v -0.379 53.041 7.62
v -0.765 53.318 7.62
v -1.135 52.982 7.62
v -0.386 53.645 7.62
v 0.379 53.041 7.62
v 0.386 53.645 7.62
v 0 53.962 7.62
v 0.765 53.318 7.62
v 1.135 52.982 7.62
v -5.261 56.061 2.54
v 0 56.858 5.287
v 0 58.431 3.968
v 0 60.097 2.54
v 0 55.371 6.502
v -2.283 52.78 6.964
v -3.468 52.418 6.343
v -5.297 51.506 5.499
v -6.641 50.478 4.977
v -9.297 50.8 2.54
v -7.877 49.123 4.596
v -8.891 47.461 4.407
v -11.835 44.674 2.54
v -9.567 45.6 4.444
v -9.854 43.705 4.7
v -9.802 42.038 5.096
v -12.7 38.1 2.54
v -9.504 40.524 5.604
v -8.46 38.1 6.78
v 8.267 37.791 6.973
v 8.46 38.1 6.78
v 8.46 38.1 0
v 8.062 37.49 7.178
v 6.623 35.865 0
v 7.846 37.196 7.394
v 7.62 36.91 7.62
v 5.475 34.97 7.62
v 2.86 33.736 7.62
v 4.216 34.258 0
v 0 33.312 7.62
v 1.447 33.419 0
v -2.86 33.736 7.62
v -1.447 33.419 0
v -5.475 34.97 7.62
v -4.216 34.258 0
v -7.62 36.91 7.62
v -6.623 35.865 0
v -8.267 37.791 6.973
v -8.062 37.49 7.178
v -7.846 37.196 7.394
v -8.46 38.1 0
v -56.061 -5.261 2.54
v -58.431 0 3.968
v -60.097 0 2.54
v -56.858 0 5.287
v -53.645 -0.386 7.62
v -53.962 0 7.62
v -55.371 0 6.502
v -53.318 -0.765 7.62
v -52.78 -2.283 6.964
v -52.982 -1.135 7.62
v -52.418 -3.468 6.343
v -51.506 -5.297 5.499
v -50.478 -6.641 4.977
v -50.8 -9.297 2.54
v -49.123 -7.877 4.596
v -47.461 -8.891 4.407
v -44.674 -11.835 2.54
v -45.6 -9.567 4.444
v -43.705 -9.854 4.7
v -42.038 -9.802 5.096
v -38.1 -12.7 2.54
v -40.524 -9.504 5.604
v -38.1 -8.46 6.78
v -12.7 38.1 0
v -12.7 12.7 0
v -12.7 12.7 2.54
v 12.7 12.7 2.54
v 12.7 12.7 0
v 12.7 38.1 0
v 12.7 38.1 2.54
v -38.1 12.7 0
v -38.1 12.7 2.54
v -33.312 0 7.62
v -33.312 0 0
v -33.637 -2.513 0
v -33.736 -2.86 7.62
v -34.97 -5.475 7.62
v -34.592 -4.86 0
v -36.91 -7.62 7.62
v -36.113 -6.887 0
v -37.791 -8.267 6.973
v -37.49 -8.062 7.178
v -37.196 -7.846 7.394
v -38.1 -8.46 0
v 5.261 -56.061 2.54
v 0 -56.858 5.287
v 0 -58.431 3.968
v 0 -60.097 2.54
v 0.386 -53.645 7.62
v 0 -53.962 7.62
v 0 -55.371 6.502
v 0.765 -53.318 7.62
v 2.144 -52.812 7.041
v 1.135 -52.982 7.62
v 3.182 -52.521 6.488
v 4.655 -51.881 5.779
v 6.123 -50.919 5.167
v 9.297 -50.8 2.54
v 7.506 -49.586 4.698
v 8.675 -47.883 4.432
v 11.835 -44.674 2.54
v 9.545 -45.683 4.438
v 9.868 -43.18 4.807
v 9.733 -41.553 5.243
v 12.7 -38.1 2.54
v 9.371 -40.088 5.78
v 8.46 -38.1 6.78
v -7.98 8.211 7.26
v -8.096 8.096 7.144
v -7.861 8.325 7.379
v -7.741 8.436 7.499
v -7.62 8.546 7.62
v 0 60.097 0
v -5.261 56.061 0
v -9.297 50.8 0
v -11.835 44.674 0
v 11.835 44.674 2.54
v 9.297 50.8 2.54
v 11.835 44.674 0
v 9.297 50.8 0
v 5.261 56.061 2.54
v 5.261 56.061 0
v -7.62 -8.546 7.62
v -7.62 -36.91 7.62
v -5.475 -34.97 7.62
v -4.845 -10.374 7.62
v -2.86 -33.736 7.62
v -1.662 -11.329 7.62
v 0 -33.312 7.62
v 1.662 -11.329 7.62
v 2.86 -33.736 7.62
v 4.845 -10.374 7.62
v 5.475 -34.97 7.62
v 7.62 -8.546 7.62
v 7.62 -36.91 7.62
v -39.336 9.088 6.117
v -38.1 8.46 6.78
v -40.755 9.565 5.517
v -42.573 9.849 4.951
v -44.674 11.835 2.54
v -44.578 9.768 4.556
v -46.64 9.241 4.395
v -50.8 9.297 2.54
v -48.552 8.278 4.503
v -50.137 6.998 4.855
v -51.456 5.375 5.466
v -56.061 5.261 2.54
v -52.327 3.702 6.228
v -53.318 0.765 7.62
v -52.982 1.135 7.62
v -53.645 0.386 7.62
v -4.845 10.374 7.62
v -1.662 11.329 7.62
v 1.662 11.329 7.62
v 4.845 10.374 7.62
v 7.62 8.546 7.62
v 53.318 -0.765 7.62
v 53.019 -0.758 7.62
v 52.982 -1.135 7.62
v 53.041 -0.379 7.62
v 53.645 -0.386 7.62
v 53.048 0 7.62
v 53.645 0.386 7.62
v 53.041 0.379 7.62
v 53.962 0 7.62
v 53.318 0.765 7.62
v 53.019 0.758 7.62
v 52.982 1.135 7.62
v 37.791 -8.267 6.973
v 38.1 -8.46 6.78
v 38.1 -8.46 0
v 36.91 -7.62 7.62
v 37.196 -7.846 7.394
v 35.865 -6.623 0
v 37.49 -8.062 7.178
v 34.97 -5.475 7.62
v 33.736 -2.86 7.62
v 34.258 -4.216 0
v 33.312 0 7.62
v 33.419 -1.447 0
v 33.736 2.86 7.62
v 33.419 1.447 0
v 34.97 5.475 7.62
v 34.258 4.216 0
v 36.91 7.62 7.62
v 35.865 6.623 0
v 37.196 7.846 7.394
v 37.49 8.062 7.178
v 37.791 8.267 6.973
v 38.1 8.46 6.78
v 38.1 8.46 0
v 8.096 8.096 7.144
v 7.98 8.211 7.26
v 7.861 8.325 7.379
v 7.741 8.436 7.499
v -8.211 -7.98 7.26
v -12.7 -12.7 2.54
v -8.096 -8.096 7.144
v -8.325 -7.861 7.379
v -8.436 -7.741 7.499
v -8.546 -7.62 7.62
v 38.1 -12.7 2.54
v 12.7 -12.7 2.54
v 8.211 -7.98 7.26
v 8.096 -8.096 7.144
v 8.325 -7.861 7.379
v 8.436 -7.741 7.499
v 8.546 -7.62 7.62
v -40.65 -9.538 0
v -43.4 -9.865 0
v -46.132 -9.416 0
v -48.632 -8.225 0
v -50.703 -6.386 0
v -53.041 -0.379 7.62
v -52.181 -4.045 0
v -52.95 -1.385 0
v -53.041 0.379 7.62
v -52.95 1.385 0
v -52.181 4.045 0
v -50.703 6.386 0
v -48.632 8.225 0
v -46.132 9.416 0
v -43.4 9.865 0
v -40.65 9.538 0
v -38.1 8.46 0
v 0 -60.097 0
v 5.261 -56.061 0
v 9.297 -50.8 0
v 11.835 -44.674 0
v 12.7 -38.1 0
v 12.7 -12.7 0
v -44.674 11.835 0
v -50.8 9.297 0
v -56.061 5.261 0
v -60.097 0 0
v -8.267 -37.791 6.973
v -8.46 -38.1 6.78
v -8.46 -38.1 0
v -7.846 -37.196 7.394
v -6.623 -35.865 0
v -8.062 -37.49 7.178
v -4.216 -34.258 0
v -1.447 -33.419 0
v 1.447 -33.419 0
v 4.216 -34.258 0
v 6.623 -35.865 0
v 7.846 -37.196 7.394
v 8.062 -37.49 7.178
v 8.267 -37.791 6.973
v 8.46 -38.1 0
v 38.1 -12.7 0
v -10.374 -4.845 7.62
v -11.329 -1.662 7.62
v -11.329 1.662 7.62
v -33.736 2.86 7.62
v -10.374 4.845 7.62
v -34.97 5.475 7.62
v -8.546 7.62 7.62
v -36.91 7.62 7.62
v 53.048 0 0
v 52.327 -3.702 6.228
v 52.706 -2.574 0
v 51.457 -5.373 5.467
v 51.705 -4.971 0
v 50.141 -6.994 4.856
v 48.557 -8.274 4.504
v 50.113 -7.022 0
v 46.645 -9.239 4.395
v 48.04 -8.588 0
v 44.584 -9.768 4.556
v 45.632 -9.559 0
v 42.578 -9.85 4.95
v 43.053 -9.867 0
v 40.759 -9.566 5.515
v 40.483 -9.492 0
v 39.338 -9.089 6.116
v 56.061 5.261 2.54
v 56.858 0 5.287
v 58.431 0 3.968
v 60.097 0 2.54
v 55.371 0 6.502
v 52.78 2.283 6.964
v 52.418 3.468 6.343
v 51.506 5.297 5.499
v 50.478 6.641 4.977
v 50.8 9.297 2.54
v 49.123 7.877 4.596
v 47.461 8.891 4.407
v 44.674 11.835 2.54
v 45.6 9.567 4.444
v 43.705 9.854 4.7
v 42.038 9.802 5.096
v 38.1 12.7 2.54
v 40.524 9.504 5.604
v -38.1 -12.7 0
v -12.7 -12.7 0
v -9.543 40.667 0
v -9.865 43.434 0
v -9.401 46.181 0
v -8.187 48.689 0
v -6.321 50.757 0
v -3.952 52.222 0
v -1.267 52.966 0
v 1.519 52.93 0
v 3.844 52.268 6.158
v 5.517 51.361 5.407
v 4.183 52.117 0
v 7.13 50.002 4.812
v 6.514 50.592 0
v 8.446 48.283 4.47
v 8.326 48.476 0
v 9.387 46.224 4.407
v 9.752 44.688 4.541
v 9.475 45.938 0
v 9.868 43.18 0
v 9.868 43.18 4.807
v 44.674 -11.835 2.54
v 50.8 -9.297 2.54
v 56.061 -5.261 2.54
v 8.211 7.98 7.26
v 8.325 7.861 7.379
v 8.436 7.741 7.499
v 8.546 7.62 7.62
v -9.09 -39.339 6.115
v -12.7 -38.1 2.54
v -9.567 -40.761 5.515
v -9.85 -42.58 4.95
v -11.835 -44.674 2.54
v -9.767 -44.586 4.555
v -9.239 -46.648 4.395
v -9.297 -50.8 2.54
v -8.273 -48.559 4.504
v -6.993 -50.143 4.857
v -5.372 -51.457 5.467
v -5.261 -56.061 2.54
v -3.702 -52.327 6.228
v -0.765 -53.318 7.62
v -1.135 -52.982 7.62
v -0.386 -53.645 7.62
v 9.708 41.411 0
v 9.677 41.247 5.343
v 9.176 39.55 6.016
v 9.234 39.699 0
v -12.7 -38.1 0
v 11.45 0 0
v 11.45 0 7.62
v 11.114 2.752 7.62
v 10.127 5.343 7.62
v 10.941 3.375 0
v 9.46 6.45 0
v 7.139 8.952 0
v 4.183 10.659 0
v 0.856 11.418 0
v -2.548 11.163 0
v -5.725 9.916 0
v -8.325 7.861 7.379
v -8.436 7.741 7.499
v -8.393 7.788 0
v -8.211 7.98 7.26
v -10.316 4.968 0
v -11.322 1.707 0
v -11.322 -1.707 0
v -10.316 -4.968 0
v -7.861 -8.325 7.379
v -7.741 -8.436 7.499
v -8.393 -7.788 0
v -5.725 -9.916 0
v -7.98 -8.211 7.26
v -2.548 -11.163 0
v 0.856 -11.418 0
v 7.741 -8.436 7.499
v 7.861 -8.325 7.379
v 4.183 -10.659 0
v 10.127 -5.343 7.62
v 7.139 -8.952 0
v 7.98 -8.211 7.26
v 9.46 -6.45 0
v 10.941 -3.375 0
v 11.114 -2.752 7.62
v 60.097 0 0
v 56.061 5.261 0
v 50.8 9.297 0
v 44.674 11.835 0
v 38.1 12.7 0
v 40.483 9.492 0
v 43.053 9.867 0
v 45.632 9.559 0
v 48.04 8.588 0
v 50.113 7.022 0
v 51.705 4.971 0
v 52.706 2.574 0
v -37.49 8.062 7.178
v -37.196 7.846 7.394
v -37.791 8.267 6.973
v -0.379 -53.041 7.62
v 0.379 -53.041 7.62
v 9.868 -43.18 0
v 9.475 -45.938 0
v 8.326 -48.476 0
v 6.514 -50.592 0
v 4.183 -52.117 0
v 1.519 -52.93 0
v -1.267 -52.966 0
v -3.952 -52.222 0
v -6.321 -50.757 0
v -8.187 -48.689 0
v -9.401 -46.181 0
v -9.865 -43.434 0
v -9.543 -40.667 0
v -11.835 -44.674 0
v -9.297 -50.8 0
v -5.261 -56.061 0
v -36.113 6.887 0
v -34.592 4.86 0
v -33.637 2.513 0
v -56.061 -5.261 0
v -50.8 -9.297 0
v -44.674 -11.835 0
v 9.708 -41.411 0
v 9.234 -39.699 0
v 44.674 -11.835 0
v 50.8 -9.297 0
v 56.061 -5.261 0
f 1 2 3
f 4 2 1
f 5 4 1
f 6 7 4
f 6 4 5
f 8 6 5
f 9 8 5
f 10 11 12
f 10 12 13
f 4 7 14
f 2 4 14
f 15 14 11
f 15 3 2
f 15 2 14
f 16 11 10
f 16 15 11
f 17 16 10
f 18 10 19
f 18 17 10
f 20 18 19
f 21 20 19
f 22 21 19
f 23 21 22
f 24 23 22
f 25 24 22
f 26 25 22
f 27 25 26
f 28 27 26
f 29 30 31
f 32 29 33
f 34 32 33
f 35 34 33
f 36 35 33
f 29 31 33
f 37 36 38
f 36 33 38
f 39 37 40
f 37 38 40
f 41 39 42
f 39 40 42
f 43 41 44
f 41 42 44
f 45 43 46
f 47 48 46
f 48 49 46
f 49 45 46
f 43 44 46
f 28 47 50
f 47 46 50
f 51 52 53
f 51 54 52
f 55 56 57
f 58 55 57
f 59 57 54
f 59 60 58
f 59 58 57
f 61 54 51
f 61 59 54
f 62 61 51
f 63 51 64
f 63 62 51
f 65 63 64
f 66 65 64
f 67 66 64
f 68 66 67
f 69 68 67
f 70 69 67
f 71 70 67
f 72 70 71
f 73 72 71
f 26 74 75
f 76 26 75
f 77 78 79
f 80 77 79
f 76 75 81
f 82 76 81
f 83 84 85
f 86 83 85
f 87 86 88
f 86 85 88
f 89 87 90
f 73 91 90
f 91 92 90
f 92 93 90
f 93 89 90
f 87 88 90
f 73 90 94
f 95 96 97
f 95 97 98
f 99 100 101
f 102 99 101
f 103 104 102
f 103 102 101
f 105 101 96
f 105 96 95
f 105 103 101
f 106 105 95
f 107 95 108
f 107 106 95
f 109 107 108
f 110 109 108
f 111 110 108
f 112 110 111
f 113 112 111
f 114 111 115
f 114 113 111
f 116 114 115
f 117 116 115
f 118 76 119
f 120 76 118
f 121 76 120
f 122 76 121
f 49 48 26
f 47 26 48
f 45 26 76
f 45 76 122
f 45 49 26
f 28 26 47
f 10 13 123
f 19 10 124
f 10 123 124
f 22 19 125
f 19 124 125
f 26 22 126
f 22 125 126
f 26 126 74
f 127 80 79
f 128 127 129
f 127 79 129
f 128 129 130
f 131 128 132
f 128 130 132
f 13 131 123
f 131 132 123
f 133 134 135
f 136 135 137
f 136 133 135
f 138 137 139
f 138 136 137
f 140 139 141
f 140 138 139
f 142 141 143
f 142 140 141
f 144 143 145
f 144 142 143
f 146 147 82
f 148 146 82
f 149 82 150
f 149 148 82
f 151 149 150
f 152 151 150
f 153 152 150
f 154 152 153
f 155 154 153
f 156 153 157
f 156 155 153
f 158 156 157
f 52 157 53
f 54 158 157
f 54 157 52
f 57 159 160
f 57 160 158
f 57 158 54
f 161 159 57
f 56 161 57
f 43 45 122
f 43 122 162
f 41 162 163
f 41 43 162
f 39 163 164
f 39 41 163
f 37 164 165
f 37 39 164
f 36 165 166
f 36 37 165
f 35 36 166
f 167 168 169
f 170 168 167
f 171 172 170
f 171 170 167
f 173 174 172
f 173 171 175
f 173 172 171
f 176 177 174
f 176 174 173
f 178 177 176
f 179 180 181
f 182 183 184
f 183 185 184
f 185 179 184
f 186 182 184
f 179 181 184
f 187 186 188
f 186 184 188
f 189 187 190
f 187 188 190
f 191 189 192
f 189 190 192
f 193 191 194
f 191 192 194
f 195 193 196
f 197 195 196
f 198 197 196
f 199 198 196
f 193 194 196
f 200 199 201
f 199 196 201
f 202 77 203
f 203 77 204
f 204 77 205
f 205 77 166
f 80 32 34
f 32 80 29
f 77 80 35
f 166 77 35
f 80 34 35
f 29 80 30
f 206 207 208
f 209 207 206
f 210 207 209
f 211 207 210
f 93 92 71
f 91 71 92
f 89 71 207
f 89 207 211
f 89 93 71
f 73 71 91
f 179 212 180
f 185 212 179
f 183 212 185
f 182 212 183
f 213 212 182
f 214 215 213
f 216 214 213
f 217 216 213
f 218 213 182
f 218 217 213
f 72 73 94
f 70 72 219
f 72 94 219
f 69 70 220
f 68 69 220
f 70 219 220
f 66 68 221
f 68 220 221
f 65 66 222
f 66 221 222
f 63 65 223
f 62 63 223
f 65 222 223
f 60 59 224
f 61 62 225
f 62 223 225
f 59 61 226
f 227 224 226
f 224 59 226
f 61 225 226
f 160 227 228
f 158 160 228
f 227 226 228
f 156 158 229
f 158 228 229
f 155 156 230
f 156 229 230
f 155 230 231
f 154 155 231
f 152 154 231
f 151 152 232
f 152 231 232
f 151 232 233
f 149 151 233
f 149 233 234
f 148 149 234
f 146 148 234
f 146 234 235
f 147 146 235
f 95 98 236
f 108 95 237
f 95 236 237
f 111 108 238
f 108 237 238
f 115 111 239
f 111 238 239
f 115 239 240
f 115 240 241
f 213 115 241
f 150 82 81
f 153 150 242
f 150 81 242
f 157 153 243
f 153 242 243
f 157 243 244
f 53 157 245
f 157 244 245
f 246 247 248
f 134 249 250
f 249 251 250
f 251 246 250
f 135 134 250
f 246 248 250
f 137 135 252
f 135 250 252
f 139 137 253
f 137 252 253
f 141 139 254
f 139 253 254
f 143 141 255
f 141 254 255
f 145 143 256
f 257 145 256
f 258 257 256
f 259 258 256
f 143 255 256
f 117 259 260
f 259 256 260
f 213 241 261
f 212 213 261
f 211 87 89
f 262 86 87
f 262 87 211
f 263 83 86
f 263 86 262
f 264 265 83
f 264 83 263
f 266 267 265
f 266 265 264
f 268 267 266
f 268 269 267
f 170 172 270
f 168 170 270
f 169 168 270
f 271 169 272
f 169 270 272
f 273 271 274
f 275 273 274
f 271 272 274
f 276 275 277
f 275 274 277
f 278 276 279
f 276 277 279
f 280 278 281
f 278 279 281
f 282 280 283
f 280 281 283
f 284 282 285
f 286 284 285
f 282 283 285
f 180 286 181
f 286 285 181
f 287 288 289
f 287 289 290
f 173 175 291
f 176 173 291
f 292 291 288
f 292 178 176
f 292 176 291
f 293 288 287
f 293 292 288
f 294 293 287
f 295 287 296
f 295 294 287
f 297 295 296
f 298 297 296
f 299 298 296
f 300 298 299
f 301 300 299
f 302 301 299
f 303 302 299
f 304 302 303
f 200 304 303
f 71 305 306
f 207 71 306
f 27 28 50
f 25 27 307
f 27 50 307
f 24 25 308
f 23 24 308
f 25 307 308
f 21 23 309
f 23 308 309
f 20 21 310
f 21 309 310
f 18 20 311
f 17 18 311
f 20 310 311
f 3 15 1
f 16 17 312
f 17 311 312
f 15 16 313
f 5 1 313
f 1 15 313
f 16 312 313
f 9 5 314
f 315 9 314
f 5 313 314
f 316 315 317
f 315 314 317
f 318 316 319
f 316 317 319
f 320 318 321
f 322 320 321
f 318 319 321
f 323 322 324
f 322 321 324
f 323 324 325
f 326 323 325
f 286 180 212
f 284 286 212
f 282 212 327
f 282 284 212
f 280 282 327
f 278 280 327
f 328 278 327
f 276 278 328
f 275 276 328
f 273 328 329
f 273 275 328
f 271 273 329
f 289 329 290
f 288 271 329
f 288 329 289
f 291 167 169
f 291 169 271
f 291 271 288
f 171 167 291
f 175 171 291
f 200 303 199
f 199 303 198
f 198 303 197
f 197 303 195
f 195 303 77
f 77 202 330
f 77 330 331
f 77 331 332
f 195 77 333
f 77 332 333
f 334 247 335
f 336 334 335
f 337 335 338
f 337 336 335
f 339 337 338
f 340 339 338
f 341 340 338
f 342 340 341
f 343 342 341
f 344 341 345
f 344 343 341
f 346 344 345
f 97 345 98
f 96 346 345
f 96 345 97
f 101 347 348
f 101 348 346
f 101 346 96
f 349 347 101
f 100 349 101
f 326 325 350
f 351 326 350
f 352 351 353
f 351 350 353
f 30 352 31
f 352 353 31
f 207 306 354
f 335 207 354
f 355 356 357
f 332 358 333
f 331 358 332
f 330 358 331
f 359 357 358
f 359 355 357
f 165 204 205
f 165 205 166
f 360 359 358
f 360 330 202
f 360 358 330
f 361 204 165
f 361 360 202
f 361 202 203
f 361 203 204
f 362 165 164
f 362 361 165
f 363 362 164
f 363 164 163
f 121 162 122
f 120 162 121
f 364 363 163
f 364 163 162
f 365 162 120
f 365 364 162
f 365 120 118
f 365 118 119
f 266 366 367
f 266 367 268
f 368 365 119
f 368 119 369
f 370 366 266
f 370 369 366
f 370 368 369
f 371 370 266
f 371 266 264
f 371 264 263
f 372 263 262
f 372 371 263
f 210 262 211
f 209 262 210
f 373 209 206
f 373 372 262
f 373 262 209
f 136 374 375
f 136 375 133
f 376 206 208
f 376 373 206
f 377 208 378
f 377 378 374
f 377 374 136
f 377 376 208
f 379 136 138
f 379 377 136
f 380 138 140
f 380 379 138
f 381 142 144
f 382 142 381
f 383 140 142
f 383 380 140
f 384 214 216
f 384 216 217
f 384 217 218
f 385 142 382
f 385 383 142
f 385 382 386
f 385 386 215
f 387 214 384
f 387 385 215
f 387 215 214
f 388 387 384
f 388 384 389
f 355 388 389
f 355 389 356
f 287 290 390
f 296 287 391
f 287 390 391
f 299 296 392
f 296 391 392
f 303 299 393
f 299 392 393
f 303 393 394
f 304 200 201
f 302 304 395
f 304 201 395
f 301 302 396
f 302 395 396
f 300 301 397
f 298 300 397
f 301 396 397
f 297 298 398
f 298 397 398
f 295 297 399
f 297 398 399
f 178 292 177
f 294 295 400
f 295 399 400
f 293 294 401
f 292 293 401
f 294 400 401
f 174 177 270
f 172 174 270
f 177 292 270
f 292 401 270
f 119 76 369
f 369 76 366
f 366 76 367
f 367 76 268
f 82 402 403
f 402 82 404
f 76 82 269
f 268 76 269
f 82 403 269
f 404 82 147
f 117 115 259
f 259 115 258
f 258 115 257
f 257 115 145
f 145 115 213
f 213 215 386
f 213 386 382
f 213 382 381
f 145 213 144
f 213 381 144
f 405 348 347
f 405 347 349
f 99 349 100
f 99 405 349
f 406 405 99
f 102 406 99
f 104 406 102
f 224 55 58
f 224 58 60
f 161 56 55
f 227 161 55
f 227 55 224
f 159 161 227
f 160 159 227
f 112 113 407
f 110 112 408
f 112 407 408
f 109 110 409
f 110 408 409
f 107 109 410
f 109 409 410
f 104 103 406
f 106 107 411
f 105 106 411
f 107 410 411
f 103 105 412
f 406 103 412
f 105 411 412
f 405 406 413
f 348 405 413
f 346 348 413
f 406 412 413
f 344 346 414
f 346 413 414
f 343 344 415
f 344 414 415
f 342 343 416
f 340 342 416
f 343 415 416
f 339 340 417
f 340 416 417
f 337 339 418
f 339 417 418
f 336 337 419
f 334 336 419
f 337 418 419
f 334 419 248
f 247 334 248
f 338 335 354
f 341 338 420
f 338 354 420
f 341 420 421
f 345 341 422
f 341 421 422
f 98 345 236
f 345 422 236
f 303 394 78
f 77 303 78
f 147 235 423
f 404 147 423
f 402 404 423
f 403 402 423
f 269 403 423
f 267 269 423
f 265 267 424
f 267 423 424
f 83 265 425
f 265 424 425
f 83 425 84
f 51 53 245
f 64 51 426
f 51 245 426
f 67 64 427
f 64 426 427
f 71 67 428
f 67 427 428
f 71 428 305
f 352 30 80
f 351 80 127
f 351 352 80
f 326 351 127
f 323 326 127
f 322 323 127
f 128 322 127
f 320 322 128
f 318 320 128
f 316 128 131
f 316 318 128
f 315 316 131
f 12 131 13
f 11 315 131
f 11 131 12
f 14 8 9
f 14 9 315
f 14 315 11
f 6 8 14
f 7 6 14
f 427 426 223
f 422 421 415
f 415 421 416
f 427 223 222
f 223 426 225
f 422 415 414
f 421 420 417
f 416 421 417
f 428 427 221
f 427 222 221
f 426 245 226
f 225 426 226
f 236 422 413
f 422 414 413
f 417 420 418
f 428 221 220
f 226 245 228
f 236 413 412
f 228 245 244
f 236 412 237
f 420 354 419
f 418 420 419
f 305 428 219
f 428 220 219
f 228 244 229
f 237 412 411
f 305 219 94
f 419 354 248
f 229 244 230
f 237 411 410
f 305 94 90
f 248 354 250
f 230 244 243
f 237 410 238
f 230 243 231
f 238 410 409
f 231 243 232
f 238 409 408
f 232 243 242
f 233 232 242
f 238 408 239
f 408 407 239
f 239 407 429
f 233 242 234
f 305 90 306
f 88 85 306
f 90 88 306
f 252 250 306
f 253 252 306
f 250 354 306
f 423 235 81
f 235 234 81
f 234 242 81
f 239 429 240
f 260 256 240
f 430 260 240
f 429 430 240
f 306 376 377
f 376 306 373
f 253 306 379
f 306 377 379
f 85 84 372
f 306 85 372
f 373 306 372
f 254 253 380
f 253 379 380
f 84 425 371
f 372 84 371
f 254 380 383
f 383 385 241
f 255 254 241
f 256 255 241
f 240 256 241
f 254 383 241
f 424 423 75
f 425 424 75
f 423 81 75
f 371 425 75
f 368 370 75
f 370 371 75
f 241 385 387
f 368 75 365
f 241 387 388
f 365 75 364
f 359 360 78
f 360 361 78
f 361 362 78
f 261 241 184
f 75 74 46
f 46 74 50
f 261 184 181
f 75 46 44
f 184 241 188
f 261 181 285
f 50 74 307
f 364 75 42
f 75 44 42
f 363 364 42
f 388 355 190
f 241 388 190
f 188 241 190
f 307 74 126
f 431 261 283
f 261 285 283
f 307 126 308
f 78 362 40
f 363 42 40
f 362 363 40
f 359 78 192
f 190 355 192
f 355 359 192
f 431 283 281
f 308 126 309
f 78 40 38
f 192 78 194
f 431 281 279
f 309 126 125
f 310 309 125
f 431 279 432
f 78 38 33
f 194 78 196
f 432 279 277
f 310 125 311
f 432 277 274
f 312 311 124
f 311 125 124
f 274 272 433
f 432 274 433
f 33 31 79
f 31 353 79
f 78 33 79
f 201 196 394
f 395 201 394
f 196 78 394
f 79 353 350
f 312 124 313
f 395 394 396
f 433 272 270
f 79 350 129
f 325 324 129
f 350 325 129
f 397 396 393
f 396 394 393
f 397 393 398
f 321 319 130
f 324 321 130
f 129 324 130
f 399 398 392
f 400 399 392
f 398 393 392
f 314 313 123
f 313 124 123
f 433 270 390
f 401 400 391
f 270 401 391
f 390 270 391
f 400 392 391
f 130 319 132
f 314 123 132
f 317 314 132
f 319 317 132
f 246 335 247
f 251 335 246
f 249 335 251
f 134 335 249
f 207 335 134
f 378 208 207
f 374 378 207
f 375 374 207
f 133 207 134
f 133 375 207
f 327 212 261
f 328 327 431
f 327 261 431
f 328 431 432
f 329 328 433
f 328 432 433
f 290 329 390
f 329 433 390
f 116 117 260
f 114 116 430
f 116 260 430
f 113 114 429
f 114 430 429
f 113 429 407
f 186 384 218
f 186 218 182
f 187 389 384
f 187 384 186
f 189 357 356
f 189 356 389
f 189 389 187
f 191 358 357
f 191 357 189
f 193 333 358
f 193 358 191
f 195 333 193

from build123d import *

# Parameters (mm, degrees)
F0_W         = 25.4
F0_H         = 25.4
F0_R         = 11.45
F1_DEPTH     = 7.62
F2_T1_DEPTH  = 25.4
F2_T3_DEPTH  = 25.4
F2_T5_DEPTH  = 25.4
F2_T7_DEPTH  = 25.4
F2_T10_ANGLE = 89.4745768315
F2_T12_ANGLE = 89.4745768315
F2_T14_ANGLE = 89.4745768315
F2_T16_ANGLE = 89.4745768315
F2_T18_ANGLE = 89.4745768315
F2_T20_ANGLE = 89.4745768315
F2_T22_ANGLE = 89.4745768315
F2_T24_ANGLE = 89.4745768315
F2_T29_DEPTH = 38.4641495789
F2_T33_DEPTH = 38.4641495789
F2_T40_DEPTH = 38.4641495789
F2_T44_DEPTH = 38.4641495789
F2_T51_DEPTH = 38.4641495789
F2_T55_DEPTH = 38.4641495789
F2_T62_DEPTH = 38.4641495789
F2_T66_DEPTH = 38.4641495789


# Not quite as in the source:
# - a fillet or chamfer that OpenCascade refuses, or shapes differently, is made with other operations: its cross-section is extruded or revolved along the edge and cut away or added


with BuildPart() as f1:
    # F0 (on Top) → F1 (new body)
    with BuildSketch(Plane.XY):
        Rectangle(F0_W, F0_H)
        Circle(F0_R, mode=Mode.SUBTRACT)
        with BuildLine():
            Line((8.4598493137, -38.1), (12.7, -38.1))
            Line((12.7, -38.1), (12.7, -12.7))
            Line((12.7, -12.7), (-12.7, -12.7))
            Line((-12.7, -12.7), (-12.7, -38.1))
            Line((-12.7, -38.1), (-8.4598493137, -38.1))
            ThreePointArc((-8.4598493137, -38.1), (0, -33.3121), (8.4598493137, -38.1))
        make_face()
        with BuildLine():
            ThreePointArc((0, -60.0970452561), (9.2970452561, -50.8), (12.7, -38.1))
            Line((12.7, -38.1), (8.4598493137, -38.1))
            ThreePointArc((8.4598493137, -38.1), (9.5093742552, -40.5442360341), (9.8679, -43.18))
            ThreePointArc((9.8679, -43.18), (-2.6357639659, -52.6893742552), (-8.4598493137, -38.1))
            Line((-8.4598493137, -38.1), (-12.7, -38.1))
            ThreePointArc((-12.7, -38.1), (-9.2970452561, -50.8), (0, -60.0970452561))
        make_face()
        with BuildLine():
            Line((38.1, -8.4598493137), (38.1, -12.7))
            ThreePointArc((38.1, -12.7), (50.8, -9.2970452561), (60.0970452561, 0))
            ThreePointArc((60.0970452561, 0), (50.8, 9.2970452561), (38.1, 12.7))
            Line((38.1, 12.7), (38.1, 8.4598493137))
            ThreePointArc((38.1, 8.4598493137), (48.0403764468, 8.5879095946), (53.0479, 0))
            ThreePointArc((53.0479, 0), (48.0403764468, -8.5879095946), (38.1, -8.4598493137))
        make_face()
        with BuildLine():
            Line((12.7, 12.7), (12.7, -12.7))
            Line((12.7, -12.7), (38.1, -12.7))
            Line((38.1, -12.7), (38.1, -8.4598493137))
            ThreePointArc((38.1, -8.4598493137), (33.3121, 0), (38.1, 8.4598493137))
            Line((38.1, 8.4598493137), (38.1, 12.7))
            Line((38.1, 12.7), (12.7, 12.7))
        make_face()
        with BuildLine():
            Line((-12.7, 12.7), (12.7, 12.7))
            Line((12.7, 12.7), (12.7, 38.1))
            Line((12.7, 38.1), (8.4598493137, 38.1))
            ThreePointArc((8.4598493137, 38.1), (0, 33.3121), (-8.4598493137, 38.1))
            Line((-8.4598493137, 38.1), (-12.7, 38.1))
            Line((-12.7, 38.1), (-12.7, 12.7))
        make_face()
        with BuildLine():
            Line((8.4598493137, 38.1), (12.7, 38.1))
            ThreePointArc((12.7, 38.1), (9.2970452561, 50.8), (0, 60.0970452561))
            ThreePointArc((0, 60.0970452561), (-9.2970452561, 50.8), (-12.7, 38.1))
            Line((-12.7, 38.1), (-8.4598493137, 38.1))
            ThreePointArc((-8.4598493137, 38.1), (-2.6357639659, 52.6893742552), (9.8679, 43.18))
            ThreePointArc((9.8679, 43.18), (9.5093742552, 40.5442360341), (8.4598493137, 38.1))
        make_face()
        with BuildLine():
            ThreePointArc((-60.0970452561, 0), (-50.8, -9.2970452561), (-38.1, -12.7))
            Line((-38.1, -12.7), (-38.1, -8.4598493137))
            ThreePointArc((-38.1, -8.4598493137), (-53.0479, 0), (-38.1, 8.4598493137))
            Line((-38.1, 8.4598493137), (-38.1, 12.7))
            ThreePointArc((-38.1, 12.7), (-50.8, 9.2970452561), (-60.0970452561, 0))
        make_face()
        with BuildLine():
            Line((-38.1, -12.7), (-12.7, -12.7))
            Line((-12.7, -12.7), (-12.7, 12.7))
            Line((-12.7, 12.7), (-38.1, 12.7))
            Line((-38.1, 12.7), (-38.1, 8.4598493137))
            ThreePointArc((-38.1, 8.4598493137), (-34.5920904054, 4.8603764468), (-33.3121, 0))
            ThreePointArc((-33.3121, 0), (-34.5920904054, -4.8603764468), (-38.1, -8.4598493137))
            Line((-38.1, -8.4598493137), (-38.1, -12.7))
        make_face()
    extrude(amount=F1_DEPTH)

    # F2: chamfer of 5.08 on 8 edges, made by hand

    # F2_s2 → F2_t1 (cut)
    with BuildSketch(Plane.YZ.offset(-38.1)):
        Polygon((-12.7, 2.54), (-7.62, 7.62), (-12.7, 7.62), align=None)
        Polygon((12.7, 2.54), (7.62, 7.62), (12.7, 7.62), align=None)
    extrude(amount=F2_T1_DEPTH, mode=Mode.SUBTRACT)

    # F2_s4 → F2_t3 (cut)
    with BuildSketch(Plane.XZ.offset(12.7)):
        Polygon((-12.7, 2.54), (-7.62, 7.62), (-12.7, 7.62), align=None)
        Polygon((12.7, 2.54), (7.62, 7.62), (12.7, 7.62), align=None)
    extrude(amount=F2_T3_DEPTH, mode=Mode.SUBTRACT)

    # F2_s6 → F2_t5 (cut)
    with BuildSketch(Plane.YZ.offset(12.7)):
        Polygon((-12.7, 2.54), (-7.62, 7.62), (-12.7, 7.62), align=None)
        Polygon((12.7, 2.54), (7.62, 7.62), (12.7, 7.62), align=None)
    extrude(amount=F2_T5_DEPTH, mode=Mode.SUBTRACT)

    # F2_s8 → F2_t7 (cut)
    with BuildSketch(Plane.XZ.offset(-38.1)):
        Polygon((12.7, 2.54), (7.62, 7.62), (12.7, 7.62), align=None)
        Polygon((-12.7, 2.54), (-7.62, 7.62), (-12.7, 7.62), align=None)
    extrude(amount=F2_T7_DEPTH, mode=Mode.SUBTRACT)

    # F2_s9 → F2_t10 (revolve, cut)
    with BuildSketch(Plane.YZ.offset(-38.1)):
        Polygon((12.7, 2.54), (7.62, 7.62), (12.7, 7.62), align=None)
    revolve(axis=Axis((-38.1, -12.7, 7.62), (0, 0, 1)), revolution_arc=F2_T10_ANGLE, mode=Mode.SUBTRACT)

    # F2_s11 → F2_t12 (revolve, cut)
    with BuildSketch(Plane(origin=(13.0483033064, 0.1196610486, 0), x_dir=(0, 0, 1), z_dir=(0.9999579525, 0.0091702357, 0))):
        Polygon((2.54, -63.3819359967), (7.62, -58.3019359967), (7.62, -63.3819359967), align=None)
    revolve(axis=Axis((12.7, 38.1, 7.62), (0, 0, 1)), revolution_arc=F2_T12_ANGLE, mode=Mode.SUBTRACT)

    # F2_s13 → F2_t14 (revolve, cut)
    with BuildSketch(Plane.XZ.offset(-38.1)):
        Polygon((12.7, 2.54), (7.62, 7.62), (12.7, 7.62), align=None)
    revolve(axis=Axis((-12.7, 38.1, 7.62), (0, 0, 1)), revolution_arc=F2_T14_ANGLE, mode=Mode.SUBTRACT)

    # F2_s15 → F2_t16 (revolve, cut)
    with BuildSketch(Plane(origin=(0.1196610486, -13.0483033064, 0), x_dir=(0, 0, 1), z_dir=(0.0091702357, -0.9999579525, 0))):
        Polygon((2.54, -63.3819359967), (7.62, -58.3019359967), (7.62, -63.3819359967), align=None)
    revolve(axis=Axis((38.1, -12.7, 7.62), (0, 0, 1)), revolution_arc=F2_T16_ANGLE, mode=Mode.SUBTRACT)

    # F2_s17 → F2_t18 (revolve, cut)
    with BuildSketch(Plane.YZ.offset(38.1)):
        Polygon((-12.7, 2.54), (-7.62, 7.62), (-12.7, 7.62), align=None)
    revolve(axis=Axis((38.1, 12.7, 7.62), (0, 0, 1)), revolution_arc=F2_T18_ANGLE, mode=Mode.SUBTRACT)

    # F2_s19 → F2_t20 (revolve, cut)
    with BuildSketch(Plane(origin=(-13.0483033064, -0.1196610486, 0), x_dir=(0, 0, 1), z_dir=(-0.9999579525, -0.0091702357, 0))):
        Polygon((2.54, -63.3819359967), (7.62, -58.3019359967), (7.62, -63.3819359967), align=None)
    revolve(axis=Axis((-12.7, -38.1, 7.62), (0, 0, 1)), revolution_arc=F2_T20_ANGLE, mode=Mode.SUBTRACT)

    # F2_s21 → F2_t22 (revolve, cut)
    with BuildSketch(Plane.XZ.offset(38.1)):
        Polygon((-12.7, 2.54), (-7.62, 7.62), (-12.7, 7.62), align=None)
    revolve(axis=Axis((12.7, -38.1, 7.62), (0, 0, 1)), revolution_arc=F2_T22_ANGLE, mode=Mode.SUBTRACT)

    # F2_s23 → F2_t24 (revolve, cut)
    with BuildSketch(Plane(origin=(-0.1196610486, 13.0483033064, 0), x_dir=(0, 0, 1), z_dir=(-0.0091702357, 0.9999579525, 0))):
        Polygon((2.54, -63.3819359967), (7.62, -58.3019359967), (7.62, -63.3819359967), align=None)
    revolve(axis=Axis((-38.1, 12.7, 7.62), (0, 0, 1)), revolution_arc=F2_T24_ANGLE, mode=Mode.SUBTRACT)


with BuildPart() as f2_tool27:
    # F2_s28 → F2_t29 (new body)
    with BuildSketch(Plane.YZ.offset(-38.1)):
        Polygon((-12.7, 2.54), (-7.62, 7.62), (-12.7, 7.62), align=None)
    extrude(amount=F2_T29_DEPTH)

    split(bisect_by=Plane.YZ.offset(-12.7), keep=Keep.TOP)


with BuildPart() as f2_tool31:
    # F2_s32 → F2_t33 (new body)
    with BuildSketch(Plane.XZ.offset(-0.3641495789)):
        Polygon((-12.7, 2.54), (-7.62, 7.62), (-12.7, 7.62), align=None)
    extrude(amount=F2_T33_DEPTH)

    split(bisect_by=Plane.XZ.offset(12.7), keep=Keep.BOTTOM)


with BuildPart() as f2_tool27_1:
    add(f2_tool27.part)

    # F2_t35: intersect F2_tool31
    add(f2_tool31.part, mode=Mode.INTERSECT)


with BuildPart() as f1_1:
    add(f1.part)

    # F2_t25: cut F2_tool27
    add(f2_tool27_1.part, mode=Mode.SUBTRACT)


with BuildPart() as f2_tool38:
    # F2_s39 → F2_t40 (new body)
    with BuildSketch(Plane.XZ.offset(38.1)):
        Polygon((12.7, 2.54), (7.62, 7.62), (12.7, 7.62), align=None)
    extrude(amount=-F2_T40_DEPTH)

    split(bisect_by=Plane.XZ.offset(12.7), keep=Keep.BOTTOM)


with BuildPart() as f2_tool42:
    # F2_s43 → F2_t44 (new body)
    with BuildSketch(Plane.YZ.offset(-0.3641495789)):
        Polygon((-12.7, 2.54), (-7.62, 7.62), (-12.7, 7.62), align=None)
    extrude(amount=F2_T44_DEPTH)

    split(bisect_by=Plane.YZ.offset(12.7), keep=Keep.BOTTOM)


with BuildPart() as f2_tool38_1:
    add(f2_tool38.part)

    # F2_t46: intersect F2_tool42
    add(f2_tool42.part, mode=Mode.INTERSECT)


with BuildPart() as f1_2:
    add(f1_1.part)

    # F2_t36: cut F2_tool38
    add(f2_tool38_1.part, mode=Mode.SUBTRACT)


with BuildPart() as f2_tool49:
    # F2_s50 → F2_t51 (new body)
    with BuildSketch(Plane.YZ.offset(38.1)):
        Polygon((12.7, 2.54), (7.62, 7.62), (12.7, 7.62), align=None)
    extrude(amount=-F2_T51_DEPTH)

    split(bisect_by=Plane.YZ.offset(12.7), keep=Keep.BOTTOM)


with BuildPart() as f2_tool53:
    # F2_s54 → F2_t55 (new body)
    with BuildSketch(Plane.XZ.offset(0.3641495789)):
        Polygon((12.7, 2.54), (7.62, 7.62), (12.7, 7.62), align=None)
    extrude(amount=-F2_T55_DEPTH)

    split(bisect_by=Plane.XZ.offset(-12.7), keep=Keep.TOP)


with BuildPart() as f2_tool49_1:
    add(f2_tool49.part)

    # F2_t57: intersect F2_tool53
    add(f2_tool53.part, mode=Mode.INTERSECT)


with BuildPart() as f1_3:
    add(f1_2.part)

    # F2_t47: cut F2_tool49
    add(f2_tool49_1.part, mode=Mode.SUBTRACT)


with BuildPart() as f2_tool60:
    # F2_s61 → F2_t62 (new body)
    with BuildSketch(Plane.XZ.offset(-38.1)):
        Polygon((-12.7, 2.54), (-7.62, 7.62), (-12.7, 7.62), align=None)
    extrude(amount=F2_T62_DEPTH)

    split(bisect_by=Plane.XZ.offset(-12.7), keep=Keep.TOP)


with BuildPart() as f2_tool64:
    # F2_s65 → F2_t66 (new body)
    with BuildSketch(Plane.YZ.offset(0.3641495789)):
        Polygon((12.7, 2.54), (7.62, 7.62), (12.7, 7.62), align=None)
    extrude(amount=-F2_T66_DEPTH)

    split(bisect_by=Plane.YZ.offset(-12.7), keep=Keep.TOP)


with BuildPart() as f2_tool60_1:
    add(f2_tool60.part)

    # F2_t68: intersect F2_tool64
    add(f2_tool64.part, mode=Mode.INTERSECT)


with BuildPart() as f1_4:
    add(f1_3.part)

    # F2_t58: cut F2_tool60
    add(f2_tool60_1.part, mode=Mode.SUBTRACT)


solid = f1_4.part
